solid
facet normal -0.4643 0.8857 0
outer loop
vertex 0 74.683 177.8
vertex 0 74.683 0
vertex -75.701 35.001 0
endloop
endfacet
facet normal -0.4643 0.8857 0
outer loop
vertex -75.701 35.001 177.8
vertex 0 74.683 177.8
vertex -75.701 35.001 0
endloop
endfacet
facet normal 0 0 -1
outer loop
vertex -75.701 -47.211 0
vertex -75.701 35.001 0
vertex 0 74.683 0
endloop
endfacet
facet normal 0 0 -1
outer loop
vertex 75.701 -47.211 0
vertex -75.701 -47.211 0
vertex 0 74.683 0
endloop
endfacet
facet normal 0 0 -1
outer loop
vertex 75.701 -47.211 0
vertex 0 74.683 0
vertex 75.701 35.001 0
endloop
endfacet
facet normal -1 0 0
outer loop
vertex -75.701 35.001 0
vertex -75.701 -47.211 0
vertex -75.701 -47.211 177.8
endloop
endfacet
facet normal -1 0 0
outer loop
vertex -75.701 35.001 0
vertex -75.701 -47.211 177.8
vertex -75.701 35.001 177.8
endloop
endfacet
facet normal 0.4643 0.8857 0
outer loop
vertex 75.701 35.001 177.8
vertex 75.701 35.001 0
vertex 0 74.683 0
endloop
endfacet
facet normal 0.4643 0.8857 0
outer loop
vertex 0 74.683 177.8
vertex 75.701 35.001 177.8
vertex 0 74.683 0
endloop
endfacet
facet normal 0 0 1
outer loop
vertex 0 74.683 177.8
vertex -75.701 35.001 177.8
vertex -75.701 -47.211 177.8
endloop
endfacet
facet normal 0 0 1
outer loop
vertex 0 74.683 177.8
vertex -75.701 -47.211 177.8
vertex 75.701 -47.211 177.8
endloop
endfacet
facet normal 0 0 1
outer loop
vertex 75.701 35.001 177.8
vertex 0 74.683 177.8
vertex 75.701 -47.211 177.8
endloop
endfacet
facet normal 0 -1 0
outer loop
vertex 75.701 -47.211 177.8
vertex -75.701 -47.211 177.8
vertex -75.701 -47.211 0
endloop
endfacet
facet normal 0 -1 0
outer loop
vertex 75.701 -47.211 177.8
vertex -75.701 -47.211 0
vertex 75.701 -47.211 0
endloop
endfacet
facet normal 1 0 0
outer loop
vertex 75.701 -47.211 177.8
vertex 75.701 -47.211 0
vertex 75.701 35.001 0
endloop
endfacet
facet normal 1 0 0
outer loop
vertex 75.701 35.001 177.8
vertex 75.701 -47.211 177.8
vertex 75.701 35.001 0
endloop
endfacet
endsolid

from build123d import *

# Parameters (mm, degrees)
F0_W     = 151.401668787
F0_H     = 82.2127312422
F1_DEPTH = 177.8


with BuildPart() as f1:
    # F0 (on Top) → F1 (new body)
    with BuildSketch(Plane.XY):
        Polygon((0, 74.6833533049), (-75.7008343935, 35.0014641881), (75.7008343935, 35.0014641881), align=None)
        with Locations((0, -6.104901433)):
            Rectangle(F0_W, F0_H)
    extrude(amount=F1_DEPTH)


solid = f1.part
